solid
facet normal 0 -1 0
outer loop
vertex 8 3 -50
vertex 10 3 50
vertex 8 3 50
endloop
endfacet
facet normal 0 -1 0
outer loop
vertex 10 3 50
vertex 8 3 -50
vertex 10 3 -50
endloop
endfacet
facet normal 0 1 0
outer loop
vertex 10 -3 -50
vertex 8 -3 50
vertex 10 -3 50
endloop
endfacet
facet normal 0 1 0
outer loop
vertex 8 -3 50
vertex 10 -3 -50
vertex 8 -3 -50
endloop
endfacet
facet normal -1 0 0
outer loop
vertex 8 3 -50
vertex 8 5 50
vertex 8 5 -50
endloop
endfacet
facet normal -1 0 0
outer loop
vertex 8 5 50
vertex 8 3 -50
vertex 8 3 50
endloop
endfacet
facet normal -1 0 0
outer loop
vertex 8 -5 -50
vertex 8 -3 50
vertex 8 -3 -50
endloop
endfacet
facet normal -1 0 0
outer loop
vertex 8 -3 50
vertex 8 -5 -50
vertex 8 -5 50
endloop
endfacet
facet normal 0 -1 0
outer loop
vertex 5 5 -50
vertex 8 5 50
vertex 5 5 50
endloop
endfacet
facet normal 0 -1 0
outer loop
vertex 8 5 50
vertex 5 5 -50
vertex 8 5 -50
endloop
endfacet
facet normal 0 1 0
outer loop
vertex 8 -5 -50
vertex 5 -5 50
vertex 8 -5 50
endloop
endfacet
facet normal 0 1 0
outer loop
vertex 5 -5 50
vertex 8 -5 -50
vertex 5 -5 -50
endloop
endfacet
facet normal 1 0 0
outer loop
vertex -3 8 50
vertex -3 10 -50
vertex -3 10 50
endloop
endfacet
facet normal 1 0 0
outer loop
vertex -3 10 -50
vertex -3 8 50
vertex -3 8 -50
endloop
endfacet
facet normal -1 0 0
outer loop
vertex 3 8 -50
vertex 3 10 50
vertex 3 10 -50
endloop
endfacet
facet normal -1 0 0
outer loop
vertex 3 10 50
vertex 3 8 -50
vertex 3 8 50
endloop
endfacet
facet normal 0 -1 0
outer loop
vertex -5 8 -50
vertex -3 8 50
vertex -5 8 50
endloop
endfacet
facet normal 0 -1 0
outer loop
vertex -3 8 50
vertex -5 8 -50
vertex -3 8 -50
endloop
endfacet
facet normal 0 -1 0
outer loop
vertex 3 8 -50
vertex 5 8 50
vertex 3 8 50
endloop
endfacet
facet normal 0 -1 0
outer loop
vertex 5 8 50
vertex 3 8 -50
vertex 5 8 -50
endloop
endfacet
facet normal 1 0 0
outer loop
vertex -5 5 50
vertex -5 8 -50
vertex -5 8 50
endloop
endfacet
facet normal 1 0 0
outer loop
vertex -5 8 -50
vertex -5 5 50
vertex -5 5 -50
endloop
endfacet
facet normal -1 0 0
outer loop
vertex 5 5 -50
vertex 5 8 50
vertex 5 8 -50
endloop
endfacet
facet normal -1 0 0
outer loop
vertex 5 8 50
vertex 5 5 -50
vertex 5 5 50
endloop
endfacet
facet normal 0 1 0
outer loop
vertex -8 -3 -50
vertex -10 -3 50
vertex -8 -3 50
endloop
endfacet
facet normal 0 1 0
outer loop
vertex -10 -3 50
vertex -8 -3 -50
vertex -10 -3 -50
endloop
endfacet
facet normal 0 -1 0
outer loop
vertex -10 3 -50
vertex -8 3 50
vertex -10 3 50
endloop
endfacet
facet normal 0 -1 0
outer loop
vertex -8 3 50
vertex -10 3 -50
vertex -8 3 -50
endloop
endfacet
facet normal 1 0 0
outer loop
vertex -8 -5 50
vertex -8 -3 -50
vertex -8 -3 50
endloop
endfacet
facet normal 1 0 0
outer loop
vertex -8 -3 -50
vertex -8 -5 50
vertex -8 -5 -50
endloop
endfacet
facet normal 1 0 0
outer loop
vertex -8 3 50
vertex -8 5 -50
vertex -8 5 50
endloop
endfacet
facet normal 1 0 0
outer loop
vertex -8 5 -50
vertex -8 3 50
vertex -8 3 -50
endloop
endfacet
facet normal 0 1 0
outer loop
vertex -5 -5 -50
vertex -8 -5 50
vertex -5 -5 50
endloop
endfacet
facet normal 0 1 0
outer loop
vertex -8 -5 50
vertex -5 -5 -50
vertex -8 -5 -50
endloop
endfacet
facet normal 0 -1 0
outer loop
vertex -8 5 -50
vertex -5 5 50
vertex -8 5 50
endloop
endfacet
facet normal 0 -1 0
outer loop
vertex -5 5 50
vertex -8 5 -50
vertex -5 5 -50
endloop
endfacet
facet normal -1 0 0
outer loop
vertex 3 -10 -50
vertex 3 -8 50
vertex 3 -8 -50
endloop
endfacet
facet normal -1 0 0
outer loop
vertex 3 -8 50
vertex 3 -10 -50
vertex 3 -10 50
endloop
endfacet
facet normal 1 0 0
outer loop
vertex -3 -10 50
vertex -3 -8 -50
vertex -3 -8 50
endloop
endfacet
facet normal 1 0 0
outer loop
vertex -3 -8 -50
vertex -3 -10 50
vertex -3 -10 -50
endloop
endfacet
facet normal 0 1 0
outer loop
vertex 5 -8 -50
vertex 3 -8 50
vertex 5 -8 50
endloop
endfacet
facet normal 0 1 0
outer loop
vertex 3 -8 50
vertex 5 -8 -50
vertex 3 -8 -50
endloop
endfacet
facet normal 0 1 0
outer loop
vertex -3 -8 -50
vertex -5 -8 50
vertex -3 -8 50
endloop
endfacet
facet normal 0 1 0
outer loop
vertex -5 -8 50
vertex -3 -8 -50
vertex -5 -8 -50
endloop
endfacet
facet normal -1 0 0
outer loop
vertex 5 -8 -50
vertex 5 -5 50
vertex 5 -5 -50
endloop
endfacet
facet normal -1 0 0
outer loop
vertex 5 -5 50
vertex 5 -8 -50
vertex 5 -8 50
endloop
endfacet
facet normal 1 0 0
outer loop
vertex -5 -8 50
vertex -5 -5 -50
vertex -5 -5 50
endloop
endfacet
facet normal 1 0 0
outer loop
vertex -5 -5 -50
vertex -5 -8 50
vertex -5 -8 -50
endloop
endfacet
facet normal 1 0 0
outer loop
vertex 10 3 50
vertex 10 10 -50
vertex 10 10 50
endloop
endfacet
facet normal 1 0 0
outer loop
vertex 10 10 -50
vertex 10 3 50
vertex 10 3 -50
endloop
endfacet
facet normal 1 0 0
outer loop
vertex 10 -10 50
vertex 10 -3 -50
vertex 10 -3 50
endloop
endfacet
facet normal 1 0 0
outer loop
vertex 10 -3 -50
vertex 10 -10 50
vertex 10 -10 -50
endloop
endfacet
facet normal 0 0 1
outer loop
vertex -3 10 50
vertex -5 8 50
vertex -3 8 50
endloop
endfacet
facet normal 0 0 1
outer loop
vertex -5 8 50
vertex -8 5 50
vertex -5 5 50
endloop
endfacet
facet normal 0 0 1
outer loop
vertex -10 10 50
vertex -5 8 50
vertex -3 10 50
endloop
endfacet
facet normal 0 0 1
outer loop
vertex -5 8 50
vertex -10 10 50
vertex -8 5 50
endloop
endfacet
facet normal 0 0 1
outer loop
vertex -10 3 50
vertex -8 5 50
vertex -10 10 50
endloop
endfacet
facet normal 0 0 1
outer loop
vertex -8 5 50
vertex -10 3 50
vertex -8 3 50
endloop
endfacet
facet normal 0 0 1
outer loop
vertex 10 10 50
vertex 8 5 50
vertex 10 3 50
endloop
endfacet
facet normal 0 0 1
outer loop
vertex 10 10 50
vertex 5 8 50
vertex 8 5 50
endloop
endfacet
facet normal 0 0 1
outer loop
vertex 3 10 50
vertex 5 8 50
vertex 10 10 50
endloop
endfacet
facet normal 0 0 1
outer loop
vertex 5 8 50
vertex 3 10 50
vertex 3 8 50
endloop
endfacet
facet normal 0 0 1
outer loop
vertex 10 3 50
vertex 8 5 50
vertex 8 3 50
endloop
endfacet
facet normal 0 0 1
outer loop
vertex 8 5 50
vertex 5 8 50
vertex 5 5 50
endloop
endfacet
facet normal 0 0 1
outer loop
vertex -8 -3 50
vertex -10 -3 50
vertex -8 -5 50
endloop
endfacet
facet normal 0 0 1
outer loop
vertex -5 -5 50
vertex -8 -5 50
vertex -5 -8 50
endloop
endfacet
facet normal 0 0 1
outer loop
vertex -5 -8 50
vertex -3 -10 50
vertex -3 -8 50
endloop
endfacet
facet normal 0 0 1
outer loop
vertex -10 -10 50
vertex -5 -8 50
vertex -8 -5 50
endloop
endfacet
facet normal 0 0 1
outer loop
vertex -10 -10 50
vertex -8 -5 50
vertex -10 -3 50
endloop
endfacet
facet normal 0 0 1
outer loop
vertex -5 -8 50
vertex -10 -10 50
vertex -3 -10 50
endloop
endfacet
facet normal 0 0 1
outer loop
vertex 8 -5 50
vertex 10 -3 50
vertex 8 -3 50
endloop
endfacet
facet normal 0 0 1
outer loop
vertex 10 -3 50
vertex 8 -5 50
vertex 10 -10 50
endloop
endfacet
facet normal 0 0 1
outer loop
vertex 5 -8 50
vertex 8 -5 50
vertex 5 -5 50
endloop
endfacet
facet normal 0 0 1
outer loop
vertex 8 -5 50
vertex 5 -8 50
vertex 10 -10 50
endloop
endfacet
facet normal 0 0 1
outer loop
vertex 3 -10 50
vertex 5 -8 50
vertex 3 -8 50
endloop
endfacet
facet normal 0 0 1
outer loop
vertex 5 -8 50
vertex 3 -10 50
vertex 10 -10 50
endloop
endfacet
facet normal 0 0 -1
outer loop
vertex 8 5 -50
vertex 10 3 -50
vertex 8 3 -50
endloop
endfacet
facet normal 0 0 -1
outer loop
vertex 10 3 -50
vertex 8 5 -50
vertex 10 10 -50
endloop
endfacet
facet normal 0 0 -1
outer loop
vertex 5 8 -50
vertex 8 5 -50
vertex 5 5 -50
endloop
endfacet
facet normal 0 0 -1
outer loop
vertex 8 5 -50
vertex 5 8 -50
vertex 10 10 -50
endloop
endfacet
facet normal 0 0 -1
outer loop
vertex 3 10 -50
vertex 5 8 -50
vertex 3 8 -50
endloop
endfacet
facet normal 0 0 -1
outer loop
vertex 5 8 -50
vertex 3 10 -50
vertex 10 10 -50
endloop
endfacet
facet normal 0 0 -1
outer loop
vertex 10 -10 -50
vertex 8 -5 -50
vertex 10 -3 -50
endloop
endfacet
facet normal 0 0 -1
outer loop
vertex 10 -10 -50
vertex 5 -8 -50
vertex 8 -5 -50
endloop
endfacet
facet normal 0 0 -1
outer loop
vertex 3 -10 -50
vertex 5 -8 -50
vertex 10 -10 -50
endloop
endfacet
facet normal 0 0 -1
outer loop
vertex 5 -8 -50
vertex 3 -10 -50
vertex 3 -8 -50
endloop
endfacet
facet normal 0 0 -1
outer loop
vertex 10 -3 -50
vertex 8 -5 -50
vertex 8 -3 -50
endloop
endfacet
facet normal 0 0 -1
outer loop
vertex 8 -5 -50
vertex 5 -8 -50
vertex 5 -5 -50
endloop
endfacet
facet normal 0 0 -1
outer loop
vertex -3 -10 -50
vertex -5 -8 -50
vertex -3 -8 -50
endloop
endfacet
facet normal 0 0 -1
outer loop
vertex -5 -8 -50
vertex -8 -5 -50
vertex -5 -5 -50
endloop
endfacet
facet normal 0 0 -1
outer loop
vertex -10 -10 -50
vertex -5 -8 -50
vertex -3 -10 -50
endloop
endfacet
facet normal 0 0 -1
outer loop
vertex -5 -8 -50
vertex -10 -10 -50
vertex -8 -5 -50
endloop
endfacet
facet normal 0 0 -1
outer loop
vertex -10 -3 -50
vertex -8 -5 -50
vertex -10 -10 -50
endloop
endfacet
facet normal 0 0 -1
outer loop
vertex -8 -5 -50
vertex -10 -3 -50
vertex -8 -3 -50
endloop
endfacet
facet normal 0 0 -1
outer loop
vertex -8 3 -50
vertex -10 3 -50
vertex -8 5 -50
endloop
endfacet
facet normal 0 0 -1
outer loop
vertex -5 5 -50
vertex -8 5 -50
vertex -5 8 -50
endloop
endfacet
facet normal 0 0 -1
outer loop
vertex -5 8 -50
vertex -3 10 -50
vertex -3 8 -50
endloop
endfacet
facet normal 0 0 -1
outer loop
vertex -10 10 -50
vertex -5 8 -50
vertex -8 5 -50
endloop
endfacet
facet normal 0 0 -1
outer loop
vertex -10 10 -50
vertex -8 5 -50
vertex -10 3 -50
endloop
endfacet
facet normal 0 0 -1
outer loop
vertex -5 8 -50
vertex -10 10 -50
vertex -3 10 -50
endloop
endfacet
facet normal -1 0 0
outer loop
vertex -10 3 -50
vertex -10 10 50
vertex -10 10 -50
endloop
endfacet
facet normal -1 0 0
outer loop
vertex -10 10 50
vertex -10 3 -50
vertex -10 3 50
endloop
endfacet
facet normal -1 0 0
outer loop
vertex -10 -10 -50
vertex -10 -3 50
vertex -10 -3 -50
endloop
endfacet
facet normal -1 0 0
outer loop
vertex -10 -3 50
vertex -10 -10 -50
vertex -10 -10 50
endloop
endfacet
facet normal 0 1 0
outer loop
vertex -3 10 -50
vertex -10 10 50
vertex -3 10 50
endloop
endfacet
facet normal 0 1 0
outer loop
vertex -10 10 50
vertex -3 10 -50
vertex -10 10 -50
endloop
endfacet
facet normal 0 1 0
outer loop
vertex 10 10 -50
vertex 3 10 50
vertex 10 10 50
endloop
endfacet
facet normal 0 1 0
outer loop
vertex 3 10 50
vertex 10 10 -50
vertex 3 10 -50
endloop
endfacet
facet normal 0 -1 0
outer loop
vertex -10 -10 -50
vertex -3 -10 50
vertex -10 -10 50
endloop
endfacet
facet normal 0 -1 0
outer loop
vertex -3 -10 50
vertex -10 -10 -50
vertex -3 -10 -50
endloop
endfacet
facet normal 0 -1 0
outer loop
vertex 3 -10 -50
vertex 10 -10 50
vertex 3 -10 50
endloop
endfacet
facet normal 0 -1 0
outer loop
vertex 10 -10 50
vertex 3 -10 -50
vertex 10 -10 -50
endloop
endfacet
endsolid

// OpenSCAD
$fn=64;

module tslot2020_profile(len=100, size=20, slot=6, wall=2, core=8) {
    difference() {
        translate([0,0,0]) cube([size, size, len], center=true);

        // central core hole
        cylinder(h=len+0.2, d=core, center=true);

        // T-slots on four sides (approximated)
        for (a = [0,90,180,270]) {
            rotate([0,0,a]) {
                // slot opening from side
                translate([size/2 - wall/2, 0, 0])
                    cube([wall+0.2, slot, len+0.2], center=true);

                // inner cavity behind opening
                translate([size/2 - wall - 3, 0, 0])
                    cube([6, 10, len+0.2], center=true);
            }
        }
    }
}

tslot2020_profile(len=100, size=20, slot=6, wall=2, core=8);
